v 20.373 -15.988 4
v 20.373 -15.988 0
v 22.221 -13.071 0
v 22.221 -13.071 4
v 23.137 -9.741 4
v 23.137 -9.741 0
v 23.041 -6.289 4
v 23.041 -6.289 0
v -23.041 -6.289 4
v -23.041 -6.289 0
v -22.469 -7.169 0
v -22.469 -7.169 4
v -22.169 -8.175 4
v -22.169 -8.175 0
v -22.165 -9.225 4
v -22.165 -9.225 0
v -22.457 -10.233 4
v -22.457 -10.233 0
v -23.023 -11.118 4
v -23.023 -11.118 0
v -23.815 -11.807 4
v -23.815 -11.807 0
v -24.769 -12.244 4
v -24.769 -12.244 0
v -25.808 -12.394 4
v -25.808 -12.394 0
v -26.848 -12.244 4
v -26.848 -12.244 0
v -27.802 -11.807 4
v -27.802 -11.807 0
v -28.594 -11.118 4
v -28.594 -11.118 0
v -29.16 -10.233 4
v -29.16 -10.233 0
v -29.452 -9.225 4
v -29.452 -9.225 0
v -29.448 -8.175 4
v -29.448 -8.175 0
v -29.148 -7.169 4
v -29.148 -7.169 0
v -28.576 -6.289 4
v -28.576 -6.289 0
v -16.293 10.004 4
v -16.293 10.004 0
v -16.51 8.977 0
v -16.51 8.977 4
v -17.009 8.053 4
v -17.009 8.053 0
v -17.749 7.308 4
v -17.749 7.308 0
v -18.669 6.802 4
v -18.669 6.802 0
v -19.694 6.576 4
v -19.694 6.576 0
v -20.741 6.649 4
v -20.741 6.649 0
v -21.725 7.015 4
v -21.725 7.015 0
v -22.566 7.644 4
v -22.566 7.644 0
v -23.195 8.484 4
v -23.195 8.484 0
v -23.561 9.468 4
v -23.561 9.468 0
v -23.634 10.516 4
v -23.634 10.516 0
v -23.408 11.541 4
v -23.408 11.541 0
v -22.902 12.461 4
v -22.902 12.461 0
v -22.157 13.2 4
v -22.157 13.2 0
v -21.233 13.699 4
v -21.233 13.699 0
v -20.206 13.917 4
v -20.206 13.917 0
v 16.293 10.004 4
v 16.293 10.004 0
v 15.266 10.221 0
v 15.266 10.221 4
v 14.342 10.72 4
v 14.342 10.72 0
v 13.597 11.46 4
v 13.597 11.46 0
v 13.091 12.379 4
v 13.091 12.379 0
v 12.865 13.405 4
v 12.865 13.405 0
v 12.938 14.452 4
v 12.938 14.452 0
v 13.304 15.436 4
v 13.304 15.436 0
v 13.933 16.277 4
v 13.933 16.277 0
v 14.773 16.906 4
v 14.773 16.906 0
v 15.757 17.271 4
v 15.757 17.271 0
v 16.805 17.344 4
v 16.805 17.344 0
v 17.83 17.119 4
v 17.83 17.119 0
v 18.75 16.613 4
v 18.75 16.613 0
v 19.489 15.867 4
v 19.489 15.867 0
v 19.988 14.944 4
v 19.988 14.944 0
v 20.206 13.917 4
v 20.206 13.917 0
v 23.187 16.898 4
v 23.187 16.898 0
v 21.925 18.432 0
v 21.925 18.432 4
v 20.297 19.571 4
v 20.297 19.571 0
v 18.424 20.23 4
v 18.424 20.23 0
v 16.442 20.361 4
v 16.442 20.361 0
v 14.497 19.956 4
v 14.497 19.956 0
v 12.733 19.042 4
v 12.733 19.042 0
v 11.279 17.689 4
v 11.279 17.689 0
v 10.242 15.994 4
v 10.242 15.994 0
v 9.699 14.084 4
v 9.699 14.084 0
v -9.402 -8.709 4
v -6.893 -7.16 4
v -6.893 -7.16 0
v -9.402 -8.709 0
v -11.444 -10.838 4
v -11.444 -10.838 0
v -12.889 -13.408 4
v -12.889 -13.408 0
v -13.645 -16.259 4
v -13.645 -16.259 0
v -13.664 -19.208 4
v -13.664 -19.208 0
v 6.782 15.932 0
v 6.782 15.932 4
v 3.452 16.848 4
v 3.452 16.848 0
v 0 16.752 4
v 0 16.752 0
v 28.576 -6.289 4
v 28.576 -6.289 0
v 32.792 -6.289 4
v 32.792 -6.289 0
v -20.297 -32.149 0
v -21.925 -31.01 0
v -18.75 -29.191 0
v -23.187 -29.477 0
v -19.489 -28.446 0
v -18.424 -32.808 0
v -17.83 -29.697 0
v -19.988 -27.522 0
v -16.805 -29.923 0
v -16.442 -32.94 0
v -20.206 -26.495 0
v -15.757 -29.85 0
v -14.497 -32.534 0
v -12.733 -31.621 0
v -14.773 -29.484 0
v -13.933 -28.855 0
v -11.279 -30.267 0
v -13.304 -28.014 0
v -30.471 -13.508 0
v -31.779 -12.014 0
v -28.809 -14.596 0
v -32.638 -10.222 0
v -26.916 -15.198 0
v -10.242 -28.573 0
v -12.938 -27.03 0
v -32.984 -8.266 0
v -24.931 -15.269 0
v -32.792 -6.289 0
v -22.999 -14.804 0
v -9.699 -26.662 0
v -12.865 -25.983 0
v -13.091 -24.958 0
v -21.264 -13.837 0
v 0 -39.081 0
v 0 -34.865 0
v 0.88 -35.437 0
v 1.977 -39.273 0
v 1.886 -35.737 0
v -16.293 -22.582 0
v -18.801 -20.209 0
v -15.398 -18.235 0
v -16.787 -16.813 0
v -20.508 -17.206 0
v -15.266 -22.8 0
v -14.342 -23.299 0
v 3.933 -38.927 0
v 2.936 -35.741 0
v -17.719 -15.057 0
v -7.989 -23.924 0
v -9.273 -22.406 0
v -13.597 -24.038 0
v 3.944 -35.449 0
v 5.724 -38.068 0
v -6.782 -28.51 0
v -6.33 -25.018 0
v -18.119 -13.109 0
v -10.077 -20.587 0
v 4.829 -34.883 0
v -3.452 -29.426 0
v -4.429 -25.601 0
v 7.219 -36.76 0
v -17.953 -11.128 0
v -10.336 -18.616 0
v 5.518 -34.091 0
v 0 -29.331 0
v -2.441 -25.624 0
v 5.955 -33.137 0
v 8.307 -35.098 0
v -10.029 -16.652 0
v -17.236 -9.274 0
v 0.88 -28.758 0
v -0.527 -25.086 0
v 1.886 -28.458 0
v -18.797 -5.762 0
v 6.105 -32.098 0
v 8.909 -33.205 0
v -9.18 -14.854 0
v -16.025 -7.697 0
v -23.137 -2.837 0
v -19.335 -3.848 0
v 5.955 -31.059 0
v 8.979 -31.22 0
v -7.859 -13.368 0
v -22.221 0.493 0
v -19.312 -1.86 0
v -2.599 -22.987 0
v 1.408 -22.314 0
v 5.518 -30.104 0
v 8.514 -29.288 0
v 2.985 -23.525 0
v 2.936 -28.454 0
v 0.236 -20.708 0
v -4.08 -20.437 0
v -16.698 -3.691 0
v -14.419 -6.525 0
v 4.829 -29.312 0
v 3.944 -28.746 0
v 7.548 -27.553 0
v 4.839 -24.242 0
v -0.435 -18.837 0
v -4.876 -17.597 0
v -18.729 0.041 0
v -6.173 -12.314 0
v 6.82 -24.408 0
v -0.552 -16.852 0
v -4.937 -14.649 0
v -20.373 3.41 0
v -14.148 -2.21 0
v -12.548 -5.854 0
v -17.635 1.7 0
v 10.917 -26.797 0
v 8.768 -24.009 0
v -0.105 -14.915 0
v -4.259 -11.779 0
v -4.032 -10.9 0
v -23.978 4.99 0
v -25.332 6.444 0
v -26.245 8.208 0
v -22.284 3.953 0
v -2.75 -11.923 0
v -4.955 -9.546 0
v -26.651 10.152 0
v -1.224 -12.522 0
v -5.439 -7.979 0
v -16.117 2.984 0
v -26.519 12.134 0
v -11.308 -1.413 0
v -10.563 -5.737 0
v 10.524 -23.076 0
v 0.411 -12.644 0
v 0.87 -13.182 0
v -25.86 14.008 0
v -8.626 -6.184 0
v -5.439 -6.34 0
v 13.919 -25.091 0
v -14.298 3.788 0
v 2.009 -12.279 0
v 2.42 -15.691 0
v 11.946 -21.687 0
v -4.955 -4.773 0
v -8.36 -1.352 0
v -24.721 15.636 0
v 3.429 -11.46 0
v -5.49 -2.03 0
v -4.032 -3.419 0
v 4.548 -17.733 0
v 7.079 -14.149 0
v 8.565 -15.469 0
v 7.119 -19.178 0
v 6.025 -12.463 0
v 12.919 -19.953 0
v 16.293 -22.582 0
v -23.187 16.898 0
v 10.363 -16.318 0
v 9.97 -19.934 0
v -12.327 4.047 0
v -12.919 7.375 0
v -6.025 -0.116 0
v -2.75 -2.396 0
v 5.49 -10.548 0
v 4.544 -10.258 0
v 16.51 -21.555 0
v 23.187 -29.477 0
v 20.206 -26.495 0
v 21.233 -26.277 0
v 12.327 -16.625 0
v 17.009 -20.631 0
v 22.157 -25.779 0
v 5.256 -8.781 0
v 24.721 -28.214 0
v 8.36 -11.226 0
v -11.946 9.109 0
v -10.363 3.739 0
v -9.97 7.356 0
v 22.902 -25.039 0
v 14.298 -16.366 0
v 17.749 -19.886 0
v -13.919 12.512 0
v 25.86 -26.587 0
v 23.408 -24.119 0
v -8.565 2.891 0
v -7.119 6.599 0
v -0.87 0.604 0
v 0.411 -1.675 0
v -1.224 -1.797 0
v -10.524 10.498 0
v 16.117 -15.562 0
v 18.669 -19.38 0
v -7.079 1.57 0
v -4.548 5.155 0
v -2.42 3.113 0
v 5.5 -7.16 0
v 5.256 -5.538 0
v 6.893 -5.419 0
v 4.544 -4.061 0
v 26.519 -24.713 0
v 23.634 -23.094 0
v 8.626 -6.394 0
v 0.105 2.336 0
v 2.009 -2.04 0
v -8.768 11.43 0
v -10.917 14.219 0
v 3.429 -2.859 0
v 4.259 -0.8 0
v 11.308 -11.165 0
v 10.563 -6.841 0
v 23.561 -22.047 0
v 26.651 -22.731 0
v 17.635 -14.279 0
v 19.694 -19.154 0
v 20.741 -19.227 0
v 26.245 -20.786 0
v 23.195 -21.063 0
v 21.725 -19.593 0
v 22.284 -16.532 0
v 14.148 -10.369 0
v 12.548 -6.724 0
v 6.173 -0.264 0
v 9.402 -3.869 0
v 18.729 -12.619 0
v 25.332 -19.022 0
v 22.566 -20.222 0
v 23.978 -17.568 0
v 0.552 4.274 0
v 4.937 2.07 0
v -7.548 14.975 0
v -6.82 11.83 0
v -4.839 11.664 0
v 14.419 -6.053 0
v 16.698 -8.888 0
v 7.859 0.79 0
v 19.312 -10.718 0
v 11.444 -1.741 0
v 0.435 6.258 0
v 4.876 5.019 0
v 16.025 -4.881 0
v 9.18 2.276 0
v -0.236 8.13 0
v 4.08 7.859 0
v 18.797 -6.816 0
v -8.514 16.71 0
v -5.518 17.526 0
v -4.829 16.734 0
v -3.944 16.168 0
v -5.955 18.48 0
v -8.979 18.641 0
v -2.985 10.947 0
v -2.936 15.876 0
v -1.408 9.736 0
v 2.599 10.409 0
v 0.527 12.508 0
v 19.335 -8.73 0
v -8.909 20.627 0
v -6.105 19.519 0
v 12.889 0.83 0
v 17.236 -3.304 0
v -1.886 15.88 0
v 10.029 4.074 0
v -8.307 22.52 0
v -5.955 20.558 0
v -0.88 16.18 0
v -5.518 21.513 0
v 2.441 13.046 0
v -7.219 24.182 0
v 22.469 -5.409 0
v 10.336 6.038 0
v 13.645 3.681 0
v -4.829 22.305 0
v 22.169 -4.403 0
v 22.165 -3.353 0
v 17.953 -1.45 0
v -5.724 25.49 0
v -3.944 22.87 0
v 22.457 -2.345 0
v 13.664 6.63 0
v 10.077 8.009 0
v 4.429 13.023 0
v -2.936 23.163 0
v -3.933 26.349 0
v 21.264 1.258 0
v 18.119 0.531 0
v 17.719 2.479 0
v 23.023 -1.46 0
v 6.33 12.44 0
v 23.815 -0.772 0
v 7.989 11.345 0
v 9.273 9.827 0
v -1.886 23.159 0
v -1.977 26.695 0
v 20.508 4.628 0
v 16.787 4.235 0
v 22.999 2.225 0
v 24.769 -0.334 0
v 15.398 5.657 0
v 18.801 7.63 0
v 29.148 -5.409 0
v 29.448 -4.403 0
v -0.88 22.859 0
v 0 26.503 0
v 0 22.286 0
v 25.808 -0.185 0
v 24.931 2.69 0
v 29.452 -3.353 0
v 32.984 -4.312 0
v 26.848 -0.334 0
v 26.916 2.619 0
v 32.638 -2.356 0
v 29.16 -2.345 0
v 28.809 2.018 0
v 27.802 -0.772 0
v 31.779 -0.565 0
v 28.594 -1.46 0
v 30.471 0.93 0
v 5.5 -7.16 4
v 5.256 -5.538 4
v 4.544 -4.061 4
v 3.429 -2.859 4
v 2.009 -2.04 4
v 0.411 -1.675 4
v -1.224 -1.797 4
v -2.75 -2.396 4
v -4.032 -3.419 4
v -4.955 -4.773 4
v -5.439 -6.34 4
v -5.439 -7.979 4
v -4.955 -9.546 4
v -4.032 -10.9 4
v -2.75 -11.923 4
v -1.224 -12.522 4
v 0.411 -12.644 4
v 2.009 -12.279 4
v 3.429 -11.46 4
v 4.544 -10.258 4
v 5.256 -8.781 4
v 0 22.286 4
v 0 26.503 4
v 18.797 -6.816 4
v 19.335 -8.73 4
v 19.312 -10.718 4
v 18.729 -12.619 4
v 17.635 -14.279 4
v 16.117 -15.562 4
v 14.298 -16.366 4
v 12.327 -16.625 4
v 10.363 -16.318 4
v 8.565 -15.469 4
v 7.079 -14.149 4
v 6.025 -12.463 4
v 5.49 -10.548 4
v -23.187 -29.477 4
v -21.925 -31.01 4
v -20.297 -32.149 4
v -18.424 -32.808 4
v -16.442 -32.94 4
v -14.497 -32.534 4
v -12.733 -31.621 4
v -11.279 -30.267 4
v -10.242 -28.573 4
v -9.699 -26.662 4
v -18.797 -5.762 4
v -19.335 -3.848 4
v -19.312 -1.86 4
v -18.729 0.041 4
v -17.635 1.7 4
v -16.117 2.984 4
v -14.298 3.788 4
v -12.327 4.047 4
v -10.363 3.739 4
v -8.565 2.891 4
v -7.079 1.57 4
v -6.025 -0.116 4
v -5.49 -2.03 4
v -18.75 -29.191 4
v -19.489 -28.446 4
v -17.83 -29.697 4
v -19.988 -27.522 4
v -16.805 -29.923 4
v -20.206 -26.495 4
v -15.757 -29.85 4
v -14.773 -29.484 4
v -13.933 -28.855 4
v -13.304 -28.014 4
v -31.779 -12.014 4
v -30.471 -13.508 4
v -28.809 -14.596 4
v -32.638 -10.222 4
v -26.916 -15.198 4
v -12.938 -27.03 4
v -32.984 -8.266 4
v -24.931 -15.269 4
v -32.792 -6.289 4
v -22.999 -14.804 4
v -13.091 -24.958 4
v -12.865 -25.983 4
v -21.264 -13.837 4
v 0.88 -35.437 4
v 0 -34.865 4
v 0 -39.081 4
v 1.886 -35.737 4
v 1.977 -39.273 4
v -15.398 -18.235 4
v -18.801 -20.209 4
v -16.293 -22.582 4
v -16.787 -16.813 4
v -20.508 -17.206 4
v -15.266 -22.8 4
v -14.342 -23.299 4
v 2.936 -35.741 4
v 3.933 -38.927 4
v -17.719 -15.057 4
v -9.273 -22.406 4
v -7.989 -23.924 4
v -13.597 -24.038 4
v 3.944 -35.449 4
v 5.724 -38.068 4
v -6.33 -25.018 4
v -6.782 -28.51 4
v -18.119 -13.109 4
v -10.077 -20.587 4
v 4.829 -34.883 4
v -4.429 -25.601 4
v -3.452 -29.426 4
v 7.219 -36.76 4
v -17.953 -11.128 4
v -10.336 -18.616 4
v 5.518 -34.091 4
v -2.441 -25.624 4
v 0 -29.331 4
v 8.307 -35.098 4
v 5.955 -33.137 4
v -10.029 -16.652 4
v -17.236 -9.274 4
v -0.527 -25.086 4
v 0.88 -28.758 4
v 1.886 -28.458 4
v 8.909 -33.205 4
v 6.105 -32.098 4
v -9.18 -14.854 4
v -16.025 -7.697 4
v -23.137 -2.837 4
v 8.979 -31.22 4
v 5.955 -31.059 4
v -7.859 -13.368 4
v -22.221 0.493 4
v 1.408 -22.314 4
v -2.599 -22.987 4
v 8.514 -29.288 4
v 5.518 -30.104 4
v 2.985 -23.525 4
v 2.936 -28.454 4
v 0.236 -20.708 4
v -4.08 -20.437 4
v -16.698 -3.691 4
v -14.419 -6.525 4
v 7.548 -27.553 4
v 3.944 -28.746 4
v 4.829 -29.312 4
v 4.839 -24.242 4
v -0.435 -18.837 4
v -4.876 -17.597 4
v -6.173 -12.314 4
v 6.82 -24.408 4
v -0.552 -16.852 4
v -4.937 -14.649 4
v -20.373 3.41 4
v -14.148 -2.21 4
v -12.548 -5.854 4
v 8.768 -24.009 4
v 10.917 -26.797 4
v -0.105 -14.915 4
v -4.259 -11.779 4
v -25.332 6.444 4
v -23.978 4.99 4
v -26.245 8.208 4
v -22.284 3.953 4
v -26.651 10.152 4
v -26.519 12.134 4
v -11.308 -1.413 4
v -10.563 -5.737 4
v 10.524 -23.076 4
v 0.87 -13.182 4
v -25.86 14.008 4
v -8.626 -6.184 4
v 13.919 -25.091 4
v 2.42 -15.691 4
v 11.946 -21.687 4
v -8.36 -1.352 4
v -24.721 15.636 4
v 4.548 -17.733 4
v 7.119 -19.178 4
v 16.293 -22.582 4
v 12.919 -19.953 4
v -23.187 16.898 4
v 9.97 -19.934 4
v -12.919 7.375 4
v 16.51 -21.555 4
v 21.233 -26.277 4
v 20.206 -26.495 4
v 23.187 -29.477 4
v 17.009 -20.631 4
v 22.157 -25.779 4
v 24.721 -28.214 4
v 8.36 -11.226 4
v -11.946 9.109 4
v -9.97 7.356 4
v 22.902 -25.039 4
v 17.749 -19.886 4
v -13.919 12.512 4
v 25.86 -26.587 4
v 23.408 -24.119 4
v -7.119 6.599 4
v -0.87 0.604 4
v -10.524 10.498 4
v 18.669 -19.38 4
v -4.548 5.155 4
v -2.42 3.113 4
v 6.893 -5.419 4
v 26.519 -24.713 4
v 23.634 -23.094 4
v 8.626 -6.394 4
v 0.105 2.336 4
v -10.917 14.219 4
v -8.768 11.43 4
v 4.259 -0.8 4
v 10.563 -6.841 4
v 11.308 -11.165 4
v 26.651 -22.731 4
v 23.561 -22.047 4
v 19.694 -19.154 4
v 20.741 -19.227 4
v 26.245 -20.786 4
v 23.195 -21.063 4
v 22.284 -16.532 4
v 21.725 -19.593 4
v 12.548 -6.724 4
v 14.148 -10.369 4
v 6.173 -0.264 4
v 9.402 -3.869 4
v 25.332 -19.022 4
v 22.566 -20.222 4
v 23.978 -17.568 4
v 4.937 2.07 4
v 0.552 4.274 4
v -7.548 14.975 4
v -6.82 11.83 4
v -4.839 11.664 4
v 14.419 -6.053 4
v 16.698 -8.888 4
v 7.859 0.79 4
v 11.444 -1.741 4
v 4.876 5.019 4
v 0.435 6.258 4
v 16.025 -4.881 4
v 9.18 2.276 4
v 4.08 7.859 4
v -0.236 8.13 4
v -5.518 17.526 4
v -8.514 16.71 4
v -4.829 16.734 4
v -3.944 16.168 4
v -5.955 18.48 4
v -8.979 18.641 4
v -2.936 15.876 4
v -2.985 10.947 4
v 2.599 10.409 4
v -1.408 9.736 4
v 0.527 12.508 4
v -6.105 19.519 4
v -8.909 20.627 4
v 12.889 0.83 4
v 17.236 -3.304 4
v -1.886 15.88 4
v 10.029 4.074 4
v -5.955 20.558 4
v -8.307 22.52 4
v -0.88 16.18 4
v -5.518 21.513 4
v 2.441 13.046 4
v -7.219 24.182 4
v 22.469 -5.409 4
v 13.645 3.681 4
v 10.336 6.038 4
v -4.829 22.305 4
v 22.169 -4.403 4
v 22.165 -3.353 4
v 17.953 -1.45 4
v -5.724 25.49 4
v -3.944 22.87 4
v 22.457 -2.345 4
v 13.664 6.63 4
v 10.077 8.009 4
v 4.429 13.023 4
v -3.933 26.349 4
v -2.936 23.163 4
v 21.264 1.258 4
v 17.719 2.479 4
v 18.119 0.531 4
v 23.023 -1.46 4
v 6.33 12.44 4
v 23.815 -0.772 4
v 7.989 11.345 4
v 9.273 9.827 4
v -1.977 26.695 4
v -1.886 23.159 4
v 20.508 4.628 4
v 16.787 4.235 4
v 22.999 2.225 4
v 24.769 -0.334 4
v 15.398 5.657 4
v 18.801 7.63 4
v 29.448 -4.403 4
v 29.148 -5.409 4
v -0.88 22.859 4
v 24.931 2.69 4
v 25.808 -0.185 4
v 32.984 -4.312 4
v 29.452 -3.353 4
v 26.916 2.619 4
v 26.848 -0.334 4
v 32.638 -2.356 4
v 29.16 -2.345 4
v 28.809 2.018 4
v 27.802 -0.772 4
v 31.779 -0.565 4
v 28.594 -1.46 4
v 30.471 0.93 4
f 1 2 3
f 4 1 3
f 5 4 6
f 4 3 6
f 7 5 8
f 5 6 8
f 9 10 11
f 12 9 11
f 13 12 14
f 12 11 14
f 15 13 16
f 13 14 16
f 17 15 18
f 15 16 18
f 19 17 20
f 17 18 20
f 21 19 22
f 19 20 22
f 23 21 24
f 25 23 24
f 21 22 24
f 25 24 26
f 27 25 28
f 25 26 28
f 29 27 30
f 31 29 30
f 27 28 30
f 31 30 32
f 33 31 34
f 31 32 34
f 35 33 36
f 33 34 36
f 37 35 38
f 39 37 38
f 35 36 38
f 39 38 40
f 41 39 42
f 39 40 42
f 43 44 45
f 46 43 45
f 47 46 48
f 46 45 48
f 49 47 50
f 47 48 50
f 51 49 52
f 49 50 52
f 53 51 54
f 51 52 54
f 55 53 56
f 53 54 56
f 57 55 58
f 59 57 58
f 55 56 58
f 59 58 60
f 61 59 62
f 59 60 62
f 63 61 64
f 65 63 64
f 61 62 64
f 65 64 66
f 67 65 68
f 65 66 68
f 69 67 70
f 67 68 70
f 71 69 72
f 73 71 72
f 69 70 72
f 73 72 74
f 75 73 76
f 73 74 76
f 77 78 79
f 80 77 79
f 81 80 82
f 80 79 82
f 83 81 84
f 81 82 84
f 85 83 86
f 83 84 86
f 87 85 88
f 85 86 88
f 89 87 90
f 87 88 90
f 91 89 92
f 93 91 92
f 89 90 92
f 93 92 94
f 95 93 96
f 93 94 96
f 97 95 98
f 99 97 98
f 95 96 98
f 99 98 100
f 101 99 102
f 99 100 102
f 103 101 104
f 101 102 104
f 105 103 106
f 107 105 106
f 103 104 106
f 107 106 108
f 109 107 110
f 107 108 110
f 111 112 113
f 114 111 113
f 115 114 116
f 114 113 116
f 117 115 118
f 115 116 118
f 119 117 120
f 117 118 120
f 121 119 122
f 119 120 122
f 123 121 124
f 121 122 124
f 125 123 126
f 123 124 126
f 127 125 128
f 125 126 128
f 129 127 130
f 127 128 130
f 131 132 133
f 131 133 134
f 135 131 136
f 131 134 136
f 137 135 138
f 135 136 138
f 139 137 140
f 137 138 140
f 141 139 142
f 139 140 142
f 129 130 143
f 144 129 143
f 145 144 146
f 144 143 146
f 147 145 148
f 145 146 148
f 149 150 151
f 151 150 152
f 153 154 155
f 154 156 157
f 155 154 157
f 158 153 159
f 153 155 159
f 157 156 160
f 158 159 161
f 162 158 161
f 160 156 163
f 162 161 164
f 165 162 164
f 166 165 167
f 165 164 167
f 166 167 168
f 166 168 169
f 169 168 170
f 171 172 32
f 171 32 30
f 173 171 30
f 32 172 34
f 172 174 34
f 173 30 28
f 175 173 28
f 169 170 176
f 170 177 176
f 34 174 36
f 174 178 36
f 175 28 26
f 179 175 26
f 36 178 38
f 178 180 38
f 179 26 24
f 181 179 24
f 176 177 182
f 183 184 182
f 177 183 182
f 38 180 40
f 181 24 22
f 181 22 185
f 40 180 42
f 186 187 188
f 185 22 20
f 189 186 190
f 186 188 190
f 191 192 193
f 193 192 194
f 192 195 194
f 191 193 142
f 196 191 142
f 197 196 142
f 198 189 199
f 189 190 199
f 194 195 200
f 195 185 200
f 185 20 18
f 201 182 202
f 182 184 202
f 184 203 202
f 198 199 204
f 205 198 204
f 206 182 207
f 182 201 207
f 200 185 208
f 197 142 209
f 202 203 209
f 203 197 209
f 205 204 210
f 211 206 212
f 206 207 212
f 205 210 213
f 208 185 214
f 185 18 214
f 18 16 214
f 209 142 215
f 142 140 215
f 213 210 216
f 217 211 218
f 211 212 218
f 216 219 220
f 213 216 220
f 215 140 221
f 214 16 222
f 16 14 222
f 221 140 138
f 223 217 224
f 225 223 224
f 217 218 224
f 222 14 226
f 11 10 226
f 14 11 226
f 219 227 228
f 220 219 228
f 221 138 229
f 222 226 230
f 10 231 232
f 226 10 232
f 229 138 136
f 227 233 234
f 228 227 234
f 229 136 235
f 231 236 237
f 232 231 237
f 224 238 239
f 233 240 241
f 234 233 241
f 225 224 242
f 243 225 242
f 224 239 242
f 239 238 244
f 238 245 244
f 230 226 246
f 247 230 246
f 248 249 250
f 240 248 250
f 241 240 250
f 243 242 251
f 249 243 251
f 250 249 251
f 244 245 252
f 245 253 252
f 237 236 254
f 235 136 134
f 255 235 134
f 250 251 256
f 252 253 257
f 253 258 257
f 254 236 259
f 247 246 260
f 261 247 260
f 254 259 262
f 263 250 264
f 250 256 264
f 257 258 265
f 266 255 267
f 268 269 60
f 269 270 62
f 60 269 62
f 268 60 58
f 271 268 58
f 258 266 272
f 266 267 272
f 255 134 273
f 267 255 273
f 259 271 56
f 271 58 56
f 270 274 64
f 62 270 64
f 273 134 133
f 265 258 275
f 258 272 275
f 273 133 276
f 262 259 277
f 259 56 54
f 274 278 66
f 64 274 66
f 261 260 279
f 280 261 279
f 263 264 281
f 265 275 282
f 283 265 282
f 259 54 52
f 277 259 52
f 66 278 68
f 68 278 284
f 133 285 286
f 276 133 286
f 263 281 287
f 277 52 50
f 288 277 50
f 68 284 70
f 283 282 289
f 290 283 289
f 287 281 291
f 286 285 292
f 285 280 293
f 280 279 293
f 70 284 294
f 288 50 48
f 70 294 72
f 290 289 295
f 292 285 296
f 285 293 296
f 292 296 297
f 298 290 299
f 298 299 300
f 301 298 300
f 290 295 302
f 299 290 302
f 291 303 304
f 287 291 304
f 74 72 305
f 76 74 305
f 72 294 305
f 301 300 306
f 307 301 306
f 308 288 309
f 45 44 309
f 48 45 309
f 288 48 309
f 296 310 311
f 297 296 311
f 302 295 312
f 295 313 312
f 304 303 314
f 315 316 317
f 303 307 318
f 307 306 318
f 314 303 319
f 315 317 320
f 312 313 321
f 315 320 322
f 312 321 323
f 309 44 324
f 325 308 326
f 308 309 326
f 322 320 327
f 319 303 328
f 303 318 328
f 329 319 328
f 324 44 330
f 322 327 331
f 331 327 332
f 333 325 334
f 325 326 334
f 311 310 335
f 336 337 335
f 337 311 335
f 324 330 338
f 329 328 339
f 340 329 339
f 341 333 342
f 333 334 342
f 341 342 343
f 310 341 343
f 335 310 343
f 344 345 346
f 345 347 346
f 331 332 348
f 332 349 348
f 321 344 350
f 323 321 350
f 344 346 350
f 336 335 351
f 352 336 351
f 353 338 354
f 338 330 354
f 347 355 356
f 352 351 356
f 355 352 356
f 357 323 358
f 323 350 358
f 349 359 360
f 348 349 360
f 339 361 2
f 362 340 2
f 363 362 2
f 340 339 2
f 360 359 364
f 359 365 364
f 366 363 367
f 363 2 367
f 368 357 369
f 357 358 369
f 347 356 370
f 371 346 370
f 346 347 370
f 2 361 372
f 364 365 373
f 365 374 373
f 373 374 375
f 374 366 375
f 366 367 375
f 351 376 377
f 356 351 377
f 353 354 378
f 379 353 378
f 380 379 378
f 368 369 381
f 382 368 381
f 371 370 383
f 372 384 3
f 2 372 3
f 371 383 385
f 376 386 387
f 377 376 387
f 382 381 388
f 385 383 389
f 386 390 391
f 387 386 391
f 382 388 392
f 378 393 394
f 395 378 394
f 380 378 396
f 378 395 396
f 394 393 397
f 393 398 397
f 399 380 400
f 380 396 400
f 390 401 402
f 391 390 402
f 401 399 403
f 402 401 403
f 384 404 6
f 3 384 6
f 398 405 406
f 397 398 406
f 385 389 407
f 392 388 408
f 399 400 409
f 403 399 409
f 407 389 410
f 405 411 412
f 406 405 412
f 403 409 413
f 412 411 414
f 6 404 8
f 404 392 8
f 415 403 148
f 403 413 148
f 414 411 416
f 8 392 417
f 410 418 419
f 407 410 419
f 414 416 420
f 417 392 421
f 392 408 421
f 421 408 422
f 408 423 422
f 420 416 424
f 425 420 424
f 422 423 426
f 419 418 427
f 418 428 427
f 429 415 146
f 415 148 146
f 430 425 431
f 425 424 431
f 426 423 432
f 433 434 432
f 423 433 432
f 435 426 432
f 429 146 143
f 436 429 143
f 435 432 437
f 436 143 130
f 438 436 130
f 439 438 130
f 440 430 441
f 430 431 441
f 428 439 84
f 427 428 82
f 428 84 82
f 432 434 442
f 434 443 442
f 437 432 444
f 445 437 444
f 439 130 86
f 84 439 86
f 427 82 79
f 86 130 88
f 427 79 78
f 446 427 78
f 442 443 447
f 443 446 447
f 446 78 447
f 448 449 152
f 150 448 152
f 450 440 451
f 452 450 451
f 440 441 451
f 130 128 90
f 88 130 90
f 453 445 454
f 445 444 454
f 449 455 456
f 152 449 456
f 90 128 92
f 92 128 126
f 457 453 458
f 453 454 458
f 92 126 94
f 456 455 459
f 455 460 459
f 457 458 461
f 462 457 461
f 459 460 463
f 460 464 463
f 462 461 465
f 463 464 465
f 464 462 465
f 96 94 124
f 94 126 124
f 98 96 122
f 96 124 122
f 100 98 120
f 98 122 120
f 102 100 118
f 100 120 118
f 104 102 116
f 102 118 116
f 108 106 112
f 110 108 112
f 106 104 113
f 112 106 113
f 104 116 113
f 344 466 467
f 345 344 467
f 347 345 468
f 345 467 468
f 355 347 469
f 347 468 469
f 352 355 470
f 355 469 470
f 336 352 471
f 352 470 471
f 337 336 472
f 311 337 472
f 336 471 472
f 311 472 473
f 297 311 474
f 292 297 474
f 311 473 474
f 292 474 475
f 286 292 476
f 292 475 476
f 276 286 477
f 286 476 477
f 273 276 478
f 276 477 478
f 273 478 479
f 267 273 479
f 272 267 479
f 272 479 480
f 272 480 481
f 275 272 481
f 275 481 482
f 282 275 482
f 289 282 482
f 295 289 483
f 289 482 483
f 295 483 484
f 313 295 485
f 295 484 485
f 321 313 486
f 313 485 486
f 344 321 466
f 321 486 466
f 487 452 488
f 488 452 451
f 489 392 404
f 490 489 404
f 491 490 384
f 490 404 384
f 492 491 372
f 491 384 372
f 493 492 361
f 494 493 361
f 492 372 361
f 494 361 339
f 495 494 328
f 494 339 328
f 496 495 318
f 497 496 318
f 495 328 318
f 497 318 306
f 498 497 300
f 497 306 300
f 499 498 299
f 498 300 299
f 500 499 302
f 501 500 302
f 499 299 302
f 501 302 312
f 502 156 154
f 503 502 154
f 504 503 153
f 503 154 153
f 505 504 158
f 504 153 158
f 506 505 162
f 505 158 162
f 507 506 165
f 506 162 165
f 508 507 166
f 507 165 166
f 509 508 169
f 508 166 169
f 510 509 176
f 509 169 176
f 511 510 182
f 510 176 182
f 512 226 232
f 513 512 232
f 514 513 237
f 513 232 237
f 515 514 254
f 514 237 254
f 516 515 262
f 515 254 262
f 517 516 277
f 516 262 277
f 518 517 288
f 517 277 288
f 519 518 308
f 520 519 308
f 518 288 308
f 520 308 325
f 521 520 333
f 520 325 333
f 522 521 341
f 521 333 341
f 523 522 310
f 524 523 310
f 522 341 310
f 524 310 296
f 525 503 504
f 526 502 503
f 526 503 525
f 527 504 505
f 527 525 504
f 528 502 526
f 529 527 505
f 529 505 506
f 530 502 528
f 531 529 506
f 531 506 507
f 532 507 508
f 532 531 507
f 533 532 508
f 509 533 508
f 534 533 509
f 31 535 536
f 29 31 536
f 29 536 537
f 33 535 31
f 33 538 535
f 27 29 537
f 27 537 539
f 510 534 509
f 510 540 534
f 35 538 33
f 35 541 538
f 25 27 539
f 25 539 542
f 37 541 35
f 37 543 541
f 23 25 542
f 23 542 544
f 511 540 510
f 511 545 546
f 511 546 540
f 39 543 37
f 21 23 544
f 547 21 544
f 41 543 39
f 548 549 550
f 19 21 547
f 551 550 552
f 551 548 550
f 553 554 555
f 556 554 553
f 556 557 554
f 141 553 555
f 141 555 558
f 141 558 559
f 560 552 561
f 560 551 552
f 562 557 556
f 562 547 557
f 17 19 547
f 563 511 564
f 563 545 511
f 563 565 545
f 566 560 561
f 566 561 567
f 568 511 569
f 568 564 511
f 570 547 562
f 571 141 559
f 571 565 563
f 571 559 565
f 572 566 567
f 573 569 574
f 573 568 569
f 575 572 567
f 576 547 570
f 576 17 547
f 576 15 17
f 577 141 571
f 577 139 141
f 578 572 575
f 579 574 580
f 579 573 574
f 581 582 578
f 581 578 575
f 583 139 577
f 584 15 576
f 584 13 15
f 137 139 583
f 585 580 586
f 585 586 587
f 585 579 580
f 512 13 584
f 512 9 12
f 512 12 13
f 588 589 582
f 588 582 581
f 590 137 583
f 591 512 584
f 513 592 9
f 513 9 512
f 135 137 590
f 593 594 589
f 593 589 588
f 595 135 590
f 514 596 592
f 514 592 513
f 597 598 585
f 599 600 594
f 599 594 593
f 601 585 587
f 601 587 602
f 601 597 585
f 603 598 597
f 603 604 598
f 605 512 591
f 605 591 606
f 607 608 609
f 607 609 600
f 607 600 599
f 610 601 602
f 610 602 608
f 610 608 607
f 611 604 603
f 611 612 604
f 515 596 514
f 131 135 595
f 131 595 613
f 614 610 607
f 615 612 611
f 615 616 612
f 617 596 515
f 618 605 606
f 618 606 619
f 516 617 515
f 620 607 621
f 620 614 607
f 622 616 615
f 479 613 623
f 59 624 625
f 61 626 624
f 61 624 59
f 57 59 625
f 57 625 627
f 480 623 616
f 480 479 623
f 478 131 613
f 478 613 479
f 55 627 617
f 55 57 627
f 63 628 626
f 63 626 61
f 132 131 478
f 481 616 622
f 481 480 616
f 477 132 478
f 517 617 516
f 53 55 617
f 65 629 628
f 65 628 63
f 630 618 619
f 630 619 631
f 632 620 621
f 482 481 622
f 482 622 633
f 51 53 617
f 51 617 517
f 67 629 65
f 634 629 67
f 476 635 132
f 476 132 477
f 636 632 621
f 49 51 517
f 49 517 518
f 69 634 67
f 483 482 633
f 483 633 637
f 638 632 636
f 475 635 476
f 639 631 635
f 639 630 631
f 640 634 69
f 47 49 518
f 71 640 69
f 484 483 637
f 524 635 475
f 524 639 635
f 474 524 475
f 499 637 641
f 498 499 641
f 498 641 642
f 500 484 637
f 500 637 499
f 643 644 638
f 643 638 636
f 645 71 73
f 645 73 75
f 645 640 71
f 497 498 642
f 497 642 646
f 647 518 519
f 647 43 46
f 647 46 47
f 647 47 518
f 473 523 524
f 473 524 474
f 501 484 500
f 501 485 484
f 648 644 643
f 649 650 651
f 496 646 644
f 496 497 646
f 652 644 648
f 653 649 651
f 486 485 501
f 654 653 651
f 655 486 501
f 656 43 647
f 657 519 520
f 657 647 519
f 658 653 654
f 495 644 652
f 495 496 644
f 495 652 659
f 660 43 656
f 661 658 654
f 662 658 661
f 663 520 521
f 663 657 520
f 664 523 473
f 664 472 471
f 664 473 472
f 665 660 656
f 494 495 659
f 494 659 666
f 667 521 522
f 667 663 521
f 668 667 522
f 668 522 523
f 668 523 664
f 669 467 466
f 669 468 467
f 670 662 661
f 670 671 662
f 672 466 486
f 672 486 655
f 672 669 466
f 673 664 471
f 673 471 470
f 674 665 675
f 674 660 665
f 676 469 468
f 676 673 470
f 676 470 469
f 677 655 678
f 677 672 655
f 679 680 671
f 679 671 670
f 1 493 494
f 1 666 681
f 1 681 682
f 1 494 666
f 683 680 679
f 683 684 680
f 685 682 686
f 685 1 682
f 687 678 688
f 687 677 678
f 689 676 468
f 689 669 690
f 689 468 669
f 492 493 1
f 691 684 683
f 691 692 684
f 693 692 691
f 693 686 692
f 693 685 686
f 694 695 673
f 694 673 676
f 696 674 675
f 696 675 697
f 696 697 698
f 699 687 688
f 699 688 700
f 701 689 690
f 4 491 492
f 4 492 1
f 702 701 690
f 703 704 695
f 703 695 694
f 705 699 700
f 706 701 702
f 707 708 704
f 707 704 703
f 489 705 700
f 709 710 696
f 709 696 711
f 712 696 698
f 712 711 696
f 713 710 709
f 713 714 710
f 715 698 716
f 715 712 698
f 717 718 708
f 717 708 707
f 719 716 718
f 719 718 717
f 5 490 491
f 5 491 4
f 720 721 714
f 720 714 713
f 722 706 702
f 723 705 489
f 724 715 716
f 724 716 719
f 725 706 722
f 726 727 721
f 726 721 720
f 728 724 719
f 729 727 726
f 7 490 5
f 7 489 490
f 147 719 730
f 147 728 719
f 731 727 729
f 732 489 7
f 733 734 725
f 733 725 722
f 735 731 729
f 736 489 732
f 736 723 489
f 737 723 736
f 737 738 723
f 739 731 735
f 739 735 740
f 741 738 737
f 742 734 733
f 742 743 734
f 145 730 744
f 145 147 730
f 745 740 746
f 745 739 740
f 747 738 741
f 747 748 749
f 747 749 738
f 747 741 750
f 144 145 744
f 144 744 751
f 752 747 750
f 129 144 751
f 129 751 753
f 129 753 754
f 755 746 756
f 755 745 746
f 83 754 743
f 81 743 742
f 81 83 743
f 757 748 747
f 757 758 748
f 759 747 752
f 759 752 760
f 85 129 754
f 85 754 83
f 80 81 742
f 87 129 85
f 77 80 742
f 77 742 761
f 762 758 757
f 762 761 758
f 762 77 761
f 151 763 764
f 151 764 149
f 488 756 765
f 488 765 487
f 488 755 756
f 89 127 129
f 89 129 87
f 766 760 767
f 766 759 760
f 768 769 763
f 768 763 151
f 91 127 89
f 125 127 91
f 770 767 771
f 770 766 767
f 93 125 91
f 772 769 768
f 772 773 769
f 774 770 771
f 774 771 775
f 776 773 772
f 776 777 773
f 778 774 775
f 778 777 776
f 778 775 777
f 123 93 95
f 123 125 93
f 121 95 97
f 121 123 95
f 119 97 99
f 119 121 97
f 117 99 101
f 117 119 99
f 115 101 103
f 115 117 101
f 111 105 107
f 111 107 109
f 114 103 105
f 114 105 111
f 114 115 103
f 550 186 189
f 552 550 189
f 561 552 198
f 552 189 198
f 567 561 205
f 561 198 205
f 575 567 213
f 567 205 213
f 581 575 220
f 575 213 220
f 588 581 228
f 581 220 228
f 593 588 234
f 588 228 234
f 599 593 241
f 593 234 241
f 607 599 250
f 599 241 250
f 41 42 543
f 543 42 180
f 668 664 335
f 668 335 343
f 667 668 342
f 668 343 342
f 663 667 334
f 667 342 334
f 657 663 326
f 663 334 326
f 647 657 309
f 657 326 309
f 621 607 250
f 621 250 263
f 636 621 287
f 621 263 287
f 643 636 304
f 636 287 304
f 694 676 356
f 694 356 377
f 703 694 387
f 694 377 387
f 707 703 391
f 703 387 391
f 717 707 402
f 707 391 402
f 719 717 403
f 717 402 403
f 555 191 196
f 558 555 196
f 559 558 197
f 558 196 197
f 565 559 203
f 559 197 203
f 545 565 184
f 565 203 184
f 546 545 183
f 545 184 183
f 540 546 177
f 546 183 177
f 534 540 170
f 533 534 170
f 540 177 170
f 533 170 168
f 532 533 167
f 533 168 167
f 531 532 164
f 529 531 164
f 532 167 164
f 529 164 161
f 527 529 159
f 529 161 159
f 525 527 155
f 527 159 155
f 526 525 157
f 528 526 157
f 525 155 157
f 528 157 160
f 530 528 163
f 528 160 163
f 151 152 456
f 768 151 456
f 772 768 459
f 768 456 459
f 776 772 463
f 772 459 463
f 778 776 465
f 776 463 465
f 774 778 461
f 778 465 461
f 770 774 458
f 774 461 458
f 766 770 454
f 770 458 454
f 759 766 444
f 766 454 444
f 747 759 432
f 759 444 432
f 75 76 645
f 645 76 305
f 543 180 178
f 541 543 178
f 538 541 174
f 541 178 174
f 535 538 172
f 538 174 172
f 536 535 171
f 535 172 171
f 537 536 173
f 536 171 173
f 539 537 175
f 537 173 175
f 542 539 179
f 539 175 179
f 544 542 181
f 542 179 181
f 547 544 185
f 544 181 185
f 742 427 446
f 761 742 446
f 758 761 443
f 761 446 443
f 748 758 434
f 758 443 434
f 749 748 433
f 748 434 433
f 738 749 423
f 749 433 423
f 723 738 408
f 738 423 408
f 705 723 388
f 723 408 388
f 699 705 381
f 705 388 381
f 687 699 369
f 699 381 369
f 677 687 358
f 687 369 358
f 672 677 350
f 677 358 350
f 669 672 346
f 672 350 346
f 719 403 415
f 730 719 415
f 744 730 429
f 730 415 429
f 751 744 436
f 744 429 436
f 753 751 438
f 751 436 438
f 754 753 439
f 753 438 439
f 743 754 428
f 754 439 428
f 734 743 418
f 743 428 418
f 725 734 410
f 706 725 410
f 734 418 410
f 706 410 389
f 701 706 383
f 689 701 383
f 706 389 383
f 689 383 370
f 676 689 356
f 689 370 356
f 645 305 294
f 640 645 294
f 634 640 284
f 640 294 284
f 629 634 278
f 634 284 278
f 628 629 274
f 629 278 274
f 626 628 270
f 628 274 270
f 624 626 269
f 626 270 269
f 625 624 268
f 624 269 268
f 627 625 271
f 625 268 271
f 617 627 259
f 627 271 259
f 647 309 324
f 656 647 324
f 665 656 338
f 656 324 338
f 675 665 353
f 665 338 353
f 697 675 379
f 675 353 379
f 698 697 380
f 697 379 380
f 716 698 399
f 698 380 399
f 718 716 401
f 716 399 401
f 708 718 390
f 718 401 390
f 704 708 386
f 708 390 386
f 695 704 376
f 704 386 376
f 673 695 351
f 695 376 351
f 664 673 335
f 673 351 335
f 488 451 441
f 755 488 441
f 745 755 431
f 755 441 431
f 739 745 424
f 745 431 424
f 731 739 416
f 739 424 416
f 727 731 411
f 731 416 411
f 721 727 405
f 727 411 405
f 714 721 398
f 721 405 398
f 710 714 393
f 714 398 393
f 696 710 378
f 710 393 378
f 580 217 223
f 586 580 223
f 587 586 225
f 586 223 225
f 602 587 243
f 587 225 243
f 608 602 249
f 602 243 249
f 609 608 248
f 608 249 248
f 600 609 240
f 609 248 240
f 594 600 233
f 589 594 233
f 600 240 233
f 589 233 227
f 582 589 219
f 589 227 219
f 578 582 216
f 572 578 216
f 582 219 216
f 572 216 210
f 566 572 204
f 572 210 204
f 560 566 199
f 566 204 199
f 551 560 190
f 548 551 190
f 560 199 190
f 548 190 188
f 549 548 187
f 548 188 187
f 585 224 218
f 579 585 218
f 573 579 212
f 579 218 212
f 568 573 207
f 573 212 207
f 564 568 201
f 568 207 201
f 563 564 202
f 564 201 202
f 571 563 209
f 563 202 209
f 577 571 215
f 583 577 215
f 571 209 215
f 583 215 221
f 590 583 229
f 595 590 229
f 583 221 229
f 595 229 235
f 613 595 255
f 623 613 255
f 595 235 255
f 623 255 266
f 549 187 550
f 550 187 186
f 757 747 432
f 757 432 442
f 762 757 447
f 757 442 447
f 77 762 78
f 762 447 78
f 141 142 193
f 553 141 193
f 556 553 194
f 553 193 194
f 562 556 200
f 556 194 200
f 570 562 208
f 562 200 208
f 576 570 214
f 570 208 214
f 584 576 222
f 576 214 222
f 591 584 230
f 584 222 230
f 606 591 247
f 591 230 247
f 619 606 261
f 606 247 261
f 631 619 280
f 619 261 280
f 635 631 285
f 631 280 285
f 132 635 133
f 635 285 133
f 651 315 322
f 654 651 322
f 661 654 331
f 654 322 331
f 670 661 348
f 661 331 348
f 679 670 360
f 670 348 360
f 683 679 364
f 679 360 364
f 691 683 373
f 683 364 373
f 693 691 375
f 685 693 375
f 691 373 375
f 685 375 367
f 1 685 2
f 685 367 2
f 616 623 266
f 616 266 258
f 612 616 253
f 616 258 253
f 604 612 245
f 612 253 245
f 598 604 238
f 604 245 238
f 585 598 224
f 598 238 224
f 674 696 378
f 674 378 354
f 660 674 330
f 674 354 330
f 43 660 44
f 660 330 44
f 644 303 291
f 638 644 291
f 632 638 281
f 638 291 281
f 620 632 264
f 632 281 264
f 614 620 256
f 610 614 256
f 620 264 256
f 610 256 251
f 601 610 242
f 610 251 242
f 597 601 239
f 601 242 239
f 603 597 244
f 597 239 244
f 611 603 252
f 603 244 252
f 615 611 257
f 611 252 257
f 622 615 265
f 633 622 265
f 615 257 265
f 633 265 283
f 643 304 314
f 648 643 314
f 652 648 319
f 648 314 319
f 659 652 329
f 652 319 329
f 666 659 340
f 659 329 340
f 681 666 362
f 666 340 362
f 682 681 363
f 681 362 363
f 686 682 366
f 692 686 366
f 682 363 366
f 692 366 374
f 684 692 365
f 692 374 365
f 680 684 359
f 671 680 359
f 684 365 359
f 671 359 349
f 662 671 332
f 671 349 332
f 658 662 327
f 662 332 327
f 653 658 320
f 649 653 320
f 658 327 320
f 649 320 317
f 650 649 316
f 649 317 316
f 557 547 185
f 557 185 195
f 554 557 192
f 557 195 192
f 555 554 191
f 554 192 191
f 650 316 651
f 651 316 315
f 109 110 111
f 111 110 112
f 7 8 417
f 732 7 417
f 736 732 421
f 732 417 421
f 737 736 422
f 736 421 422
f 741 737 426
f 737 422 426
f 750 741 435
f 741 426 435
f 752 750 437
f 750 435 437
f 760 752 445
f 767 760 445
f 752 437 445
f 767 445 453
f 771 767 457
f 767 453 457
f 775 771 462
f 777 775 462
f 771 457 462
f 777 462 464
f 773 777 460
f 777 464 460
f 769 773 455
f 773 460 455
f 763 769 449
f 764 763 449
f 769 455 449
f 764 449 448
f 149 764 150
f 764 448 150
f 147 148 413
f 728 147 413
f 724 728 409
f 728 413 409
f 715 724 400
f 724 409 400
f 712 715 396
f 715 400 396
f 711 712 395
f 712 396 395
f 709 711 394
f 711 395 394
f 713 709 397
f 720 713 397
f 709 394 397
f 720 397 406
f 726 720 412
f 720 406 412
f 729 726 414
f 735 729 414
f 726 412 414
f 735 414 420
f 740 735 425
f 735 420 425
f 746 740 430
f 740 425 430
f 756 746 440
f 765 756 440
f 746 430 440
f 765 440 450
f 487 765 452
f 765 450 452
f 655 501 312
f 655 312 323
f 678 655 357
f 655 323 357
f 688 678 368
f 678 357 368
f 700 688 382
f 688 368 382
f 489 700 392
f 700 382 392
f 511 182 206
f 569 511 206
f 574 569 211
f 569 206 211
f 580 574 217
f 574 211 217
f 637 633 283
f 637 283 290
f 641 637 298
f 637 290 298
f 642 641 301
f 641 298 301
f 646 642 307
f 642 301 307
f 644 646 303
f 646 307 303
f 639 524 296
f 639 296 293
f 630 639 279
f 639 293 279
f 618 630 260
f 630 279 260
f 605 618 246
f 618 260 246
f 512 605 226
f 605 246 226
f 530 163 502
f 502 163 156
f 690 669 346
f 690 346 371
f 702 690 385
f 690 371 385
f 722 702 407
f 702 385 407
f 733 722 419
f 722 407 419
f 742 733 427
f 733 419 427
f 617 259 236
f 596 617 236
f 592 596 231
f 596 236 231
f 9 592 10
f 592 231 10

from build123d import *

# Parameters (mm, degrees)
F1_DEPTH = 4
F2_COUNT = 8
F4_R     = 5.5
F5_DEPTH = 4


with BuildPart() as f1:
    # F0 (on Top) → F1 (new body)
    with BuildSketch(Plane.XY):
        with BuildLine():
            Line((0, 22.28635), (0, 26.502684))
            ThreePointArc((0, 26.502684), (-9.016314, 19.375069), (0, 12.247453))
            ThreePointArc((0, 12.247453), (10.336376, 6.123727), (0, 0))
            Line((0, 0), (0, -6.289178))
            ThreePointArc((0, -6.289178), (13.747998, 5.231544), (0, 16.752267))
            ThreePointArc((0, 16.752267), (-6.104504, 19.519308), (0, 22.28635))
        make_face()
    extrude(amount=F1_DEPTH)


with BuildPart() as f2_1:
    # F2: instance of F1
    add(f1.part.rotate(Axis((0, -6.289178, 2), (0, 0, 1)), 1 * 360 / F2_COUNT))


with BuildPart() as f2_2:
    # F2: instance of F1
    add(f1.part.rotate(Axis((0, -6.289178, 2), (0, 0, 1)), 2 * 360 / F2_COUNT))


with BuildPart() as f2_3:
    # F2: instance of F1
    add(f1.part.rotate(Axis((0, -6.289178, 2), (0, 0, 1)), 3 * 360 / F2_COUNT))


with BuildPart() as f2_4:
    # F2: instance of F1
    add(f1.part.rotate(Axis((0, -6.289178, 2), (0, 0, 1)), 4 * 360 / F2_COUNT))


with BuildPart() as f2_5:
    # F2: instance of F1
    add(f1.part.rotate(Axis((0, -6.289178, 2), (0, 0, 1)), 5 * 360 / F2_COUNT))


with BuildPart() as f2_6:
    # F2: instance of F1
    add(f1.part.rotate(Axis((0, -6.289178, 2), (0, 0, 1)), 6 * 360 / F2_COUNT))


with BuildPart() as f2_7:
    # F2: instance of F1
    add(f1.part.rotate(Axis((0, -6.289178, 2), (0, 0, 1)), 7 * 360 / F2_COUNT))


with BuildPart() as f2_6_1:
    add(f2_6.part)

    # F3: union F2_7, F2_5, F2_2, F2_1, F2_4, F2_3, F1
    add(f2_7.part)
    add(f2_5.part)
    add(f2_2.part)
    add(f2_1.part)
    add(f2_4.part)
    add(f2_3.part)
    add(f1.part)

    # F4 (on face) → F5 (cut)
    with BuildSketch(Plane.XY.offset(4)):
        with Locations((0, -7.159515)):
            Circle(F4_R)
    extrude(amount=-F5_DEPTH, mode=Mode.SUBTRACT)


solid = f2_6_1.part
